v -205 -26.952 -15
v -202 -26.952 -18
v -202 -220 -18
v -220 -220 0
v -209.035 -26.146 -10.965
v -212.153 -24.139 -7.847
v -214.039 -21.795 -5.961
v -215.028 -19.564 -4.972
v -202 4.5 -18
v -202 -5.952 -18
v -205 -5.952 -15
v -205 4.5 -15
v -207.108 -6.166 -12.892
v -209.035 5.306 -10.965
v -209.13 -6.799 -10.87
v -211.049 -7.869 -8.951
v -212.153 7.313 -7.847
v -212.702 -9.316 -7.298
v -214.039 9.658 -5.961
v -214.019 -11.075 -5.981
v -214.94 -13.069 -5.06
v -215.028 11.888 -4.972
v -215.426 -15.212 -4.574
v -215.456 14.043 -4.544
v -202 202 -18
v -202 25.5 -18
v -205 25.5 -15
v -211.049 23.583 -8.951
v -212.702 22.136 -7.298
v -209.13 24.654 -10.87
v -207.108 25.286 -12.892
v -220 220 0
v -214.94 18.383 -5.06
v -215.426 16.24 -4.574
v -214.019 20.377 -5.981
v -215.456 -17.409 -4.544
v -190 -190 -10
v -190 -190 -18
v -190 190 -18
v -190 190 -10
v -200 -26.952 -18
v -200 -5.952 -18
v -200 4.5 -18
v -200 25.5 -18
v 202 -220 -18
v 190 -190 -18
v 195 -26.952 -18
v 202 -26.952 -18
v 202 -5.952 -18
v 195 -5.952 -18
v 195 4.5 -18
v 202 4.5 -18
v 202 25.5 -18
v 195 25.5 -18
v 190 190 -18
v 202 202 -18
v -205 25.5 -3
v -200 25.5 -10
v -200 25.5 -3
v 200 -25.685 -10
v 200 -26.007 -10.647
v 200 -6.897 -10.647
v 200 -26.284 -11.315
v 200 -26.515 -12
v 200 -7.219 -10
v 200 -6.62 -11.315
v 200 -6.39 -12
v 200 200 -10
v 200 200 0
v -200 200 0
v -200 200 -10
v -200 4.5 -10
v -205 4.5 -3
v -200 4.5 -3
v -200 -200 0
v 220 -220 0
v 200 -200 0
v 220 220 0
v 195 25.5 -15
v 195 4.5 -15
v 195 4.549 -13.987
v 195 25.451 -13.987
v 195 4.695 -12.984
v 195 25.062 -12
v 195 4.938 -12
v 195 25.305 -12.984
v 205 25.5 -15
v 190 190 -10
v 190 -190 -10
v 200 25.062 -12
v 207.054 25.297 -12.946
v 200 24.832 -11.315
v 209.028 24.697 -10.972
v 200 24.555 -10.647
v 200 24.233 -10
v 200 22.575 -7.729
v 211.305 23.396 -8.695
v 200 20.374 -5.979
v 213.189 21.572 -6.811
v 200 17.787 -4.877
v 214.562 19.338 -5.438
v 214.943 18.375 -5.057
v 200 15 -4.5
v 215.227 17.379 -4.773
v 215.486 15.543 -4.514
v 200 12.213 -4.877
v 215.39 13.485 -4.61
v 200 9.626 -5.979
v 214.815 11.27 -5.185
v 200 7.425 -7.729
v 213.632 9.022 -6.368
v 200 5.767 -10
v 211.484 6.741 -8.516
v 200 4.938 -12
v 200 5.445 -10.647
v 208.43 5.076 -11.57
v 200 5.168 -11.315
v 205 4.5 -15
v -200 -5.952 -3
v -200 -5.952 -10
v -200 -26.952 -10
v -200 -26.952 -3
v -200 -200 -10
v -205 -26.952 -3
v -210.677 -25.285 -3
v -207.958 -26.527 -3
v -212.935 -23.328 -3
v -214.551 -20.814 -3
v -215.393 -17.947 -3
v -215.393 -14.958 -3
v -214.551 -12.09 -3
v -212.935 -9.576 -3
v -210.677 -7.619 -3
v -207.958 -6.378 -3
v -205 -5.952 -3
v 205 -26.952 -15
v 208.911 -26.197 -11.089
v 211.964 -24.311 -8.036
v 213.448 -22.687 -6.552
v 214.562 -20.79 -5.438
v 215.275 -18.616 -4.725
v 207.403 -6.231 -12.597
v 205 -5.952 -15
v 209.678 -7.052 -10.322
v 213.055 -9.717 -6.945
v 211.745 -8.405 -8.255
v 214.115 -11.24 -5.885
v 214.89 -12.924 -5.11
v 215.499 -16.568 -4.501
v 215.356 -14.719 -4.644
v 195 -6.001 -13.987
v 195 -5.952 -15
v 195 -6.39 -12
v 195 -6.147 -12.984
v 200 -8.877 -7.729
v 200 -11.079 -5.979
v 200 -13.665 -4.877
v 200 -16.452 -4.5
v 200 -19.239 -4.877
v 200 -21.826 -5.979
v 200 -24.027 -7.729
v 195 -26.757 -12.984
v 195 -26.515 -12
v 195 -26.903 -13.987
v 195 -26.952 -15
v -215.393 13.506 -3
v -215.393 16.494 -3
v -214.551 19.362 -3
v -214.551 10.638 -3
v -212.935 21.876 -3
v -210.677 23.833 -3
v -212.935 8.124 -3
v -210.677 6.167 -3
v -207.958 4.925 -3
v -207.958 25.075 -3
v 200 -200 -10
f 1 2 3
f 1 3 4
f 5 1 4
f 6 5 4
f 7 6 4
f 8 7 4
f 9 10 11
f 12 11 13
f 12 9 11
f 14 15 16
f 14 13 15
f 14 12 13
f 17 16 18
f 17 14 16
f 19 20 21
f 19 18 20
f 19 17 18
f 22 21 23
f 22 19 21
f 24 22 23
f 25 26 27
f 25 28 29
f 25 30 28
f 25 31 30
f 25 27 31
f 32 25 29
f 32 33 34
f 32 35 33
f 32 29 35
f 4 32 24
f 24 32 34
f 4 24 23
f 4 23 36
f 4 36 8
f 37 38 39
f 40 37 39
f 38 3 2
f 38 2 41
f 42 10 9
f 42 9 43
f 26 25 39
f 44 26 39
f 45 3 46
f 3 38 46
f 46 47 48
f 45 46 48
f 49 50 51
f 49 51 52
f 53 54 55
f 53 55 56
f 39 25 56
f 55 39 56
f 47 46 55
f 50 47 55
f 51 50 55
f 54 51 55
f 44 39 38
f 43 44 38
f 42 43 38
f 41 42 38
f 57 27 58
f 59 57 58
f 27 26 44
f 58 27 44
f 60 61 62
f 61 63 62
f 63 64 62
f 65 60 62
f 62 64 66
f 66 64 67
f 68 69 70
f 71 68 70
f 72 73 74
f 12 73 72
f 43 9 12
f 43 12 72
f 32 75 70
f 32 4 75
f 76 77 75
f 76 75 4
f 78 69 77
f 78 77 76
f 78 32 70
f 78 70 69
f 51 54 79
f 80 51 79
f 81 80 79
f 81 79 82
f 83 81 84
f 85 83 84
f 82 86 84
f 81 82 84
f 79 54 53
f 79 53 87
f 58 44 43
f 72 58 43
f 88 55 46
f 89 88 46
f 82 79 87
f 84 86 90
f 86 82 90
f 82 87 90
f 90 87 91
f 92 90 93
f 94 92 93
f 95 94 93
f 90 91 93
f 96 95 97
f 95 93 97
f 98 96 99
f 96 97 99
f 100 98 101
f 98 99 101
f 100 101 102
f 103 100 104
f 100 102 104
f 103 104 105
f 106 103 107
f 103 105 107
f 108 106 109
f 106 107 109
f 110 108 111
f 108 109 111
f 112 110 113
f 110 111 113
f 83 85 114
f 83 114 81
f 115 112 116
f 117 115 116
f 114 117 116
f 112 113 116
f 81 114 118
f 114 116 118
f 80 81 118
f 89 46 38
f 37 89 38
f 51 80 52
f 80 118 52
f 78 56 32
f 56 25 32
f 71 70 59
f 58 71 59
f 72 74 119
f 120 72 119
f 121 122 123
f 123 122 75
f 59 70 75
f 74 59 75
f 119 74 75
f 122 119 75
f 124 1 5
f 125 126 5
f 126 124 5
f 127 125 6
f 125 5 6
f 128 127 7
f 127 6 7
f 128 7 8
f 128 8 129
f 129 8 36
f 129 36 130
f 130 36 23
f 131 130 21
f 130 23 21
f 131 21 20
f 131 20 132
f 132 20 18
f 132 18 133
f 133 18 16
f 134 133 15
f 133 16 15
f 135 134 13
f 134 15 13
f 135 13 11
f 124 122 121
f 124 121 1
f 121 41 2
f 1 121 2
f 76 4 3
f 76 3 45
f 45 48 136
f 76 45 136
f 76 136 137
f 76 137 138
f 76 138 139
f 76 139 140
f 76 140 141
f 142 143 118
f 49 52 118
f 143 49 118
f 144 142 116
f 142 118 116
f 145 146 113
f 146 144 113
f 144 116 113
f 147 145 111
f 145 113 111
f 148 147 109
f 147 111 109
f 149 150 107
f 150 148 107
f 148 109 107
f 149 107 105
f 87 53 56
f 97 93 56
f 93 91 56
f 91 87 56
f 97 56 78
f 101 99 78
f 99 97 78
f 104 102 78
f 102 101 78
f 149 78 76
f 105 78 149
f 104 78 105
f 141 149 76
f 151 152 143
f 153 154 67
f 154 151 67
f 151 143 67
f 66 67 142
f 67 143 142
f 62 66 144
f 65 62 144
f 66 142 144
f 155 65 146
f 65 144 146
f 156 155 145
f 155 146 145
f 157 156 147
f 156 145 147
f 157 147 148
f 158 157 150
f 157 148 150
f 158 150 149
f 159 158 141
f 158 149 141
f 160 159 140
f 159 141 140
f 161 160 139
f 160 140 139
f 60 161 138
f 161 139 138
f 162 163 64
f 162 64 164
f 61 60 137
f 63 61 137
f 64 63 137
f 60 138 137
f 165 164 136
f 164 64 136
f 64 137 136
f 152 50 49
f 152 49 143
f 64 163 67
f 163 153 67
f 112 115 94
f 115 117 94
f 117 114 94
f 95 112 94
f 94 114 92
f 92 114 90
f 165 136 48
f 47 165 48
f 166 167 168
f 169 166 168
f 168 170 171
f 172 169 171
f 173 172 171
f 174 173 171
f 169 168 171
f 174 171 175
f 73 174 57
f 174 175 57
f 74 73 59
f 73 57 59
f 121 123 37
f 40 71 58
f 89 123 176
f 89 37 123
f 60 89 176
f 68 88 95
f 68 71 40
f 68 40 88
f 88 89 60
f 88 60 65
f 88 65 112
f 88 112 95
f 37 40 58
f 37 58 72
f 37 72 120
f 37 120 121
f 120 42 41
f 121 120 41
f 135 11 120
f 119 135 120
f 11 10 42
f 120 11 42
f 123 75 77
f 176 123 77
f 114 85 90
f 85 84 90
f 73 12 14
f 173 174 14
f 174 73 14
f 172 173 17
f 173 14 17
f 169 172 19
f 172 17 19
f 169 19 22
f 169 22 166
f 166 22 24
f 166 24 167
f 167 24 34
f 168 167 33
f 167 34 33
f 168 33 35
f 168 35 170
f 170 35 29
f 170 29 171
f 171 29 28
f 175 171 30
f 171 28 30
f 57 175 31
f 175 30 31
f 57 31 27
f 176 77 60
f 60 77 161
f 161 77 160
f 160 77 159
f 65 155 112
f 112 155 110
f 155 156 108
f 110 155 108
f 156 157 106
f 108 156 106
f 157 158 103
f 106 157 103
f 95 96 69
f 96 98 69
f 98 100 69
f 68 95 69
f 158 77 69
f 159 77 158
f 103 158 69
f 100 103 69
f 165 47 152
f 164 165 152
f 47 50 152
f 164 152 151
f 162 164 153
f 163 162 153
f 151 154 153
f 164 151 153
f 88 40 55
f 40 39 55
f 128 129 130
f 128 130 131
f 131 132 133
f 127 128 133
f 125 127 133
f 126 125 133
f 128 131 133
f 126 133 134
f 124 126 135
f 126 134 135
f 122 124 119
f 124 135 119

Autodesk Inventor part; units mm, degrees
ref_plane "YZ Plane" through (0, 0, 0) normal (1, 0, 0) x (0, 1, 0)
sketch "Skizze1" plane through (0, 0, 0) normal (0, 0, 1) x (1, 0, 0)
  line L0 (-220, -220) -> (220, -220) projected
  line L1 (220, 220) -> (220, -220) projected
  line L2 (-220, 220) -> (-220, -220) projected
  line L3 (-220, 220) -> (220, 220) projected
  line L4 (200, 200) -> (-200, 200) projected
  line L5 (-200, 200) -> (-200, -200) projected
  line L6 (-200, -200) -> (200, -200) projected
  line L7 (200, -200) -> (200, 200) projected
  line L8 (220, -220) -> (-220, -220)
  line L9 (-220, -220) -> (-220, 220)
  line L10 (-220, 220) -> (220, 220)
  line L11 (220, 220) -> (220, -220)
  line L12 (200, -200) -> (-200, -200)
  line L13 (-200, -200) -> (-200, 200)
  line L14 (-200, 200) -> (200, 200)
  line L15 (200, 200) -> (200, -200)
  point P0 (0, 0)
extrude "Extrusion1" add sketch "Skizze1" against normal blind 18
ref_plane "Arbeitsebene1" through (0, 0, -20) normal (0, 0, 1) x (1, 0, 0)
sketch "Skizze3" plane through (0, 0, -20) normal (0, 0, 1) x (1, 0, 0)
  arc A0 (-205, 25.5) -> (-205, 4.5) centre (-205, 15) ccw projected
  arc A1 (-205, 25.5) -> (-205, 4.5) centre (-205, 15) ccw projected
  arc A2 (-205, -5.9522) -> (-205, -26.9522) centre (-205, -16.4522) ccw projected
  arc A3 (-205, -5.9522) -> (-205, -26.9522) centre (-205, -16.4522) ccw projected
  arc A4 (-205, -5.9522) -> (-205, -26.9522) centre (-205, -16.4522) ccw projected
  arc A5 (-205, -5.9522) -> (-205, -26.9522) centre (-205, -16.4522) ccw projected
  line L0 (-200, -26.9522) -> (-205, -26.9522) projected
  line L1 (-205, -5.9522) -> (-200, -5.9522) projected
  line L2 (-205, 4.5) -> (-200, 4.5)
  line L3 (-200, -200) -> (-200, 200) projected
  line L4 (-205, 25.5) -> (-200, 25.5)
  line L5 (-205, -5.9522) -> (-200, -5.9522)
  line L6 (-205, -26.9522) -> (-200, -26.9522)
  arc A6 (-205, 25.5) -> (-205, 4.5) centre (-205, 15) ccw
  arc A7 (-205, -5.9522) -> (-205, -26.9522) centre (-205, -16.4522) ccw
  point P0 (0, 0)
extrude "Extrusion2" cut sketch "Skizze3" along normal blind 17
sketch "Skizze5" plane through (0, 0, -20) normal (0, 0, 1) x (1, 0, 0)
  line L0 (-200, -26.9522) -> (-200, -200) projected
  line L1 (-200, -200) -> (200, -200) projected
  line L2 (200, -200) -> (200, 200) projected
  line L3 (-200, 200) -> (200, 200) projected
  line L4 (-200, -200) -> (200, -200)
  line L5 (200, -200) -> (200, 200)
  line L6 (200, 200) -> (-200, 200)
  line L7 (-200, 200) -> (-200, -200)
  line L8 (-190, -190) -> (190, -190)
  line L9 (190, -190) -> (190, 190)
  line L10 (190, 190) -> (-190, 190)
  line L11 (-190, 190) -> (-190, -190)
  point P0 (0, 0)
  dimension "d8" = 10
  dimension "d9" = 10
  dimension "d10" = 10
  dimension "d11" = 10
extrude "Extrusion3" add sketch "Skizze5" along normal blind 8
ref_plane "Arbeitsebene3" through (220, -220, -440) normal (-1, 0, 0) x (0, 0, 1)
sketch "Skizze6" plane through (220, -220, -440) normal (-1, 0, 0) x (0, 0, 1)
  arc A0 (425, 193.0478) -> (425, 214.0478) centre (425, 203.5478) ccw projected
  arc A1 (425, 224.5) -> (425, 245.5) centre (425, 235) ccw projected
  line L0 (425, 224.5) -> (422, 224.5) projected
  line L1 (422, 214.0478) -> (425, 214.0478) projected
  line L2 (425, 193.0478) -> (422, 193.0478) projected
  line L3 (422, 245.5) -> (425, 245.5) projected
  line L4 (422, 193.0478) -> (428, 193.0478) projected
  line L5 (422, 193.0478) -> (425, 193.0478)
  line L6 (422, 214.0478) -> (425, 214.0478)
  line L7 (428, 214.0478) -> (422, 214.0478) projected
  line L8 (420, 245.5) -> (420, 224.5) projected
  line L9 (422, 224.5) -> (425, 224.5)
  line L10 (422, 245.5) -> (425, 245.5)
  line L11 (420, 193.0478) -> (420, 20) projected
  line L12 (422, 193.0478) -> (422, 214.0478)
  line L13 (422, 224.5) -> (422, 245.5)
  arc A2 (425, 193.0478) -> (425, 214.0478) centre (425, 203.5478) ccw
  arc A3 (425, 224.5) -> (425, 245.5) centre (425, 235) ccw
  point P0 (440, 220)
  point P1 (420, 20)
extrude "Extrusion4" cut sketch "Skizze6" along normal blind 25
sketch "Skizze7" plane through (0, 0, -20) normal (0, 0, -1) x (-1, 0, 0)
  line L0 (190, 190) -> (190, -190) projected
  line L1 (190, -190) -> (-190, -190) projected
  line L2 (-190, -190) -> (-190, 190) projected
  line L3 (-190, 190) -> (190, 190) projected
  line L4 (200, -200) -> (-200, -200) projected
  line L5 (200, 200) -> (200, -200) projected
  line L6 (-200, 200) -> (200, 200) projected
  line L7 (-200, -200) -> (-200, 200) projected
  line L8 (-200, 200) -> (200, 200) projected
  line L9 (-190, -190) -> (-190, 190) projected
  point P0 (0, 0)
extrude "Extrusion5" cut sketch "Skizze7" against normal blind 2
sketch "Skizze8" plane through (0, 0, -12) normal (0, 0, 1) x (1, 0, 0)
  line L0 (-200, -200) -> (200, -200) projected
  line L1 (200, -200) -> (200, 200) projected
  line L2 (200, 200) -> (-200, 200) projected
  line L3 (-200, 200) -> (-200, -200) projected
  line L4 (190, -190) -> (-190, -190) projected
  line L5 (-190, -190) -> (-190, 190) projected
  line L6 (-190, 190) -> (190, 190) projected
  line L7 (190, 190) -> (190, -190) projected
  line L8 (-200, -200) -> (200, -200) projected
  line L9 (200, -200) -> (200, 200) projected
  line L10 (200, 200) -> (-200, 200) projected
  line L11 (-200, 200) -> (-200, -200) projected
  point P0 (0, 0)
extrude "Extrusion6" add sketch "Skizze8" along normal blind 2
chamfer "Fase2" distance 18 angle 45 5 edges at (220, 122.75, -18) (220, -123.4761, -18) (220, -0.7261, -18) (0, 220, -18) (-220, 0, -18)
properties part number "PV_Ramen_CPY_3_CPY"
